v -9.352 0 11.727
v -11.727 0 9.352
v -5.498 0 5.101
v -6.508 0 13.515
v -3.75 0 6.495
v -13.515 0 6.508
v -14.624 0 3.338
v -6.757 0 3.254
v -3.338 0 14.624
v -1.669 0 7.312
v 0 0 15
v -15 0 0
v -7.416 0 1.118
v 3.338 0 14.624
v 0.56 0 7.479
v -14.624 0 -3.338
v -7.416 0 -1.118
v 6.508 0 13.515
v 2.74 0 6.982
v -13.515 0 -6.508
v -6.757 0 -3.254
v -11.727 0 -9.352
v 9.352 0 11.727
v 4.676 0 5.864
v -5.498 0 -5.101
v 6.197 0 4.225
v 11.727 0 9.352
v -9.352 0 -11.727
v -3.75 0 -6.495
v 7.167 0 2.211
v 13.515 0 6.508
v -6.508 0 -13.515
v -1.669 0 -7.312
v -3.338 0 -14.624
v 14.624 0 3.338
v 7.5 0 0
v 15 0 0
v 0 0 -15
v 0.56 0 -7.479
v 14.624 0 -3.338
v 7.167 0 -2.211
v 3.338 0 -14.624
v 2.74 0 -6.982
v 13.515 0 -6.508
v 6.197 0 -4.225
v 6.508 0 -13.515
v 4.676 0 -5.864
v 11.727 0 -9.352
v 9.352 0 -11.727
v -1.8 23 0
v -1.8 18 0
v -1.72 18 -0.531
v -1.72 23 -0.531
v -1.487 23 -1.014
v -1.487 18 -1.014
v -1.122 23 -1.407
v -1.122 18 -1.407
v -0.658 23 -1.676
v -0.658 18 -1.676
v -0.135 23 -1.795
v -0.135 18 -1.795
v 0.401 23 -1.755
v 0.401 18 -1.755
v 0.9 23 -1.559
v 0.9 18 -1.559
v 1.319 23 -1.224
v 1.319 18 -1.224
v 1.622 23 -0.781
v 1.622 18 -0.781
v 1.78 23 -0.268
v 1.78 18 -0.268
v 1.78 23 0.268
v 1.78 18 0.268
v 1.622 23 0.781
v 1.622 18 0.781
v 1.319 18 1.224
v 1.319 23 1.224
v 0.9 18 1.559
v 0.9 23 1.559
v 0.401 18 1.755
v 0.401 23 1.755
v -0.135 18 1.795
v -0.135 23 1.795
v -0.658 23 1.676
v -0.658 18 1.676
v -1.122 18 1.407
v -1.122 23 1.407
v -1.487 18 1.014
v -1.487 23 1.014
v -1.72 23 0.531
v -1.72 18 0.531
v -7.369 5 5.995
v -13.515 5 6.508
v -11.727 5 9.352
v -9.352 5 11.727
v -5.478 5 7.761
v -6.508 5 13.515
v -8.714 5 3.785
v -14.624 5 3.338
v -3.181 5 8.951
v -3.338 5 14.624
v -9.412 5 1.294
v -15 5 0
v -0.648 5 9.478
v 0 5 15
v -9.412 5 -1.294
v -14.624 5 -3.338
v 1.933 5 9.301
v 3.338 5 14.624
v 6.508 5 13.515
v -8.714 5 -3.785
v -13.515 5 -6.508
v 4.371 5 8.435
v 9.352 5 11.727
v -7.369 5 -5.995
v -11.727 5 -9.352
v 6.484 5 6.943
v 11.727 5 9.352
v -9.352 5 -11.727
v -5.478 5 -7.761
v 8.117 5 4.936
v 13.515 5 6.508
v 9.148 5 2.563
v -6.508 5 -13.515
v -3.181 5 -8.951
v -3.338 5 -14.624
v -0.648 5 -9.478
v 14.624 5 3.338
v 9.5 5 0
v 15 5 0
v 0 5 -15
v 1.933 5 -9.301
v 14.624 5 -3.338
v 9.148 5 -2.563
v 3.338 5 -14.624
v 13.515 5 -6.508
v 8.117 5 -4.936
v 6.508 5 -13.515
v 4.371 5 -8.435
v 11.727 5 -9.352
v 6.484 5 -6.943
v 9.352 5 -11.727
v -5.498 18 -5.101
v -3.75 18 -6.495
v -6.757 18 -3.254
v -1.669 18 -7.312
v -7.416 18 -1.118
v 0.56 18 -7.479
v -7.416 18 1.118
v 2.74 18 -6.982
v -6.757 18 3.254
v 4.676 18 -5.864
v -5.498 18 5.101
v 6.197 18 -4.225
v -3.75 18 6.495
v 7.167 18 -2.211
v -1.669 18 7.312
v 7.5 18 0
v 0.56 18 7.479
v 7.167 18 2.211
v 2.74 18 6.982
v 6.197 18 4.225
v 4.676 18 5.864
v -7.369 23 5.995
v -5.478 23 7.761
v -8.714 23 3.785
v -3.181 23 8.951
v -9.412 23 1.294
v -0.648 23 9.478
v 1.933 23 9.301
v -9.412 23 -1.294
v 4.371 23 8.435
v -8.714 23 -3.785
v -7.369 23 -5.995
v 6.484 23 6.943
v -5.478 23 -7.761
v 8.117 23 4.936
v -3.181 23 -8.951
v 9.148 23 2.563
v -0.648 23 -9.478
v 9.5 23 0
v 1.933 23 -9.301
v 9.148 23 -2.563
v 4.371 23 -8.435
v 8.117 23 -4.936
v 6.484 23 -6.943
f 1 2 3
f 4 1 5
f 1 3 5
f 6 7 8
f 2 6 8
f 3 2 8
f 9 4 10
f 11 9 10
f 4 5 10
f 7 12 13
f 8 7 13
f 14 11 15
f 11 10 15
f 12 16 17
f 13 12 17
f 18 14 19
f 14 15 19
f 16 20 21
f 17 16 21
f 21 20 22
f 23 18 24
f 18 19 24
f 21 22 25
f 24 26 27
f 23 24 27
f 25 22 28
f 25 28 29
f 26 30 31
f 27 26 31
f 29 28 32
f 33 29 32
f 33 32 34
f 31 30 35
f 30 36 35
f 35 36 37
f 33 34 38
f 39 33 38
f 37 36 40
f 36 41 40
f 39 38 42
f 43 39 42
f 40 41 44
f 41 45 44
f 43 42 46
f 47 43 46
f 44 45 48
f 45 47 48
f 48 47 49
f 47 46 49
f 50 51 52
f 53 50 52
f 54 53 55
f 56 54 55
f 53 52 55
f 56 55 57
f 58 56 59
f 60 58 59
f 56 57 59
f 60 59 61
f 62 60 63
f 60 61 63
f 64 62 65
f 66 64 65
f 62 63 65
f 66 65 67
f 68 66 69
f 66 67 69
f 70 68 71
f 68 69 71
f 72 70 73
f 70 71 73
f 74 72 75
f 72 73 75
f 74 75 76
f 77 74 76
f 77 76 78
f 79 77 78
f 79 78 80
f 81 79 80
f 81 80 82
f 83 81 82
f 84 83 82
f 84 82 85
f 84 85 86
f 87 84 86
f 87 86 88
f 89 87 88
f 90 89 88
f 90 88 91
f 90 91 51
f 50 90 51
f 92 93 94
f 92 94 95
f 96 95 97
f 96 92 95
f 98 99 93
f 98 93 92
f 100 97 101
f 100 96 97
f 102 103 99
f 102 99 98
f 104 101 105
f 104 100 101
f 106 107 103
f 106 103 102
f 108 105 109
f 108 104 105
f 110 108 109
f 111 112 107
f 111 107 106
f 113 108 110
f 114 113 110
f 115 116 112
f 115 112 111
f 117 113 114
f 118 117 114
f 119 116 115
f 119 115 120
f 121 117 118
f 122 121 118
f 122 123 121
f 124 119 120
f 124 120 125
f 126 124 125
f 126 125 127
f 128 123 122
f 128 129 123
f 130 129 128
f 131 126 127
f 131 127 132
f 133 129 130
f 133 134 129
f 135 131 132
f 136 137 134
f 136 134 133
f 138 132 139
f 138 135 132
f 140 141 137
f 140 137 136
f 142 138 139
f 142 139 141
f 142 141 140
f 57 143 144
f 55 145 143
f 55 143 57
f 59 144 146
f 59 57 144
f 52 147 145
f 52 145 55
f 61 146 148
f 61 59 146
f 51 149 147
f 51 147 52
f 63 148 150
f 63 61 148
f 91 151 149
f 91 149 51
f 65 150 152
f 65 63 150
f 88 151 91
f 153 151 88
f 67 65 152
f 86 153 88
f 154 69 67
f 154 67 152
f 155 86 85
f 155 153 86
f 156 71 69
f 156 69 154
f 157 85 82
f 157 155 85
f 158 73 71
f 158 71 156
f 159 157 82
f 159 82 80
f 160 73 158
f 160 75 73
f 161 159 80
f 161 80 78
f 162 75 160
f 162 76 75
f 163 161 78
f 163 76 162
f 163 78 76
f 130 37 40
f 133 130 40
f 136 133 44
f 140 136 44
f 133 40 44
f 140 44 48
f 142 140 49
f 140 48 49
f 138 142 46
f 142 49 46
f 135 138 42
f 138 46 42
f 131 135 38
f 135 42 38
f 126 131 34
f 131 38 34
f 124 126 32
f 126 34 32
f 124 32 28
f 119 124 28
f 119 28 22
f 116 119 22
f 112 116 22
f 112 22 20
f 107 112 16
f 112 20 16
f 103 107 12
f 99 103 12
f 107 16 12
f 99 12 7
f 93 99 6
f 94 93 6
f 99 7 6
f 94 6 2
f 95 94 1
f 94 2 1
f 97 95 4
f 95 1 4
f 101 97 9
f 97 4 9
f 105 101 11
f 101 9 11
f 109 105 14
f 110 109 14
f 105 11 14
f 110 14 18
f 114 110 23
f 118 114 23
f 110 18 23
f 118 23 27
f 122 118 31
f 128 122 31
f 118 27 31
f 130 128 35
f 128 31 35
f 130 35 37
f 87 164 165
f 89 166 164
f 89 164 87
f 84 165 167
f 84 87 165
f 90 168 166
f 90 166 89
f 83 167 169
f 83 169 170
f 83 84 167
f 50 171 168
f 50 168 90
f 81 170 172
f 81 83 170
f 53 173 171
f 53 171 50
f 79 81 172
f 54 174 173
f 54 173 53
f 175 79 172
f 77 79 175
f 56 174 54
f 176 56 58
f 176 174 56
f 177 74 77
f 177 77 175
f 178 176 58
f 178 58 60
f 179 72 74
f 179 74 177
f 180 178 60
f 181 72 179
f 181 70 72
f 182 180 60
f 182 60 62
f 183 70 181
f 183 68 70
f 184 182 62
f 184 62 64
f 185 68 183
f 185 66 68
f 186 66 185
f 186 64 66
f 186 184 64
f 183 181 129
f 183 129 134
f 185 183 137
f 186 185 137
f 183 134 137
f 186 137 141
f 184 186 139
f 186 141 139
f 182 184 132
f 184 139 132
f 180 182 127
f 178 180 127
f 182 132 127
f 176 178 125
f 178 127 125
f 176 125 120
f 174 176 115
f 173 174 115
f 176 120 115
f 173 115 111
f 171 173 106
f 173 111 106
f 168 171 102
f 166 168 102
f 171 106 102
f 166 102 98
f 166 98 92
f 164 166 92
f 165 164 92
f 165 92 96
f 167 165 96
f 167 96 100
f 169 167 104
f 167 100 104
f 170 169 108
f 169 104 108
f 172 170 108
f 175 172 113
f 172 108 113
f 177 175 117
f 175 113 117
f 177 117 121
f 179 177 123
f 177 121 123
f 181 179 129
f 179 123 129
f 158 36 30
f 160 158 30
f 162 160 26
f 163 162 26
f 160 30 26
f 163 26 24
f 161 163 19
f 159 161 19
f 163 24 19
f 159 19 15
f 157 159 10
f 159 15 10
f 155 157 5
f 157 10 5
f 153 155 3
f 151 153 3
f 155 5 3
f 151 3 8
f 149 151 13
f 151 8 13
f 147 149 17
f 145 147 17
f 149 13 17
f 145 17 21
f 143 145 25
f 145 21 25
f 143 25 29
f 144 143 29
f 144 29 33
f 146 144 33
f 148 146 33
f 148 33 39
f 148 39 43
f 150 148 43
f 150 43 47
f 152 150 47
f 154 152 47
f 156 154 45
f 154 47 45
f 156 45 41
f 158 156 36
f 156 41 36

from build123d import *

# Parameters (mm, degrees)
SKETCH2_R            = 15
BOSS_EXTRUDE1_DEPTH  = 5
SKETCH3_R            = 9.5
BOSS_EXTRUDE2_DEPTH  = 18
SKETCH4_R            = 7.5
CUT_EXTRUDE1_DEPTH   = 18
M3_CLEARANCE_HOLE1_D = 3.6


with BuildPart() as part:
    # Sketch2 → Boss-Extrude1 (new body)
    with BuildSketch(Plane(origin=(0, 0, 0), x_dir=(1, 0, 0), z_dir=(0, 1, 0))):
        Circle(SKETCH2_R)
    extrude(amount=BOSS_EXTRUDE1_DEPTH)

    # Sketch3 → Boss-Extrude2 (add)
    with BuildSketch(Plane(origin=(0, 5, 0), x_dir=(1, 0, 0), z_dir=(0, 1, 0))):
        Circle(SKETCH3_R)
    extrude(amount=BOSS_EXTRUDE2_DEPTH)

    # Sketch4 → Cut-Extrude1 (cut)
    with BuildSketch(Plane.XZ):
        Circle(SKETCH4_R)
    extrude(amount=-CUT_EXTRUDE1_DEPTH, mode=Mode.SUBTRACT)

    # M3 Clearance Hole1 (through all)
    with Locations(Plane(origin=(0, 23, 0), x_dir=(1, 0, 0), z_dir=(0, 1, 0))):
        with Locations((0, 0)):
            Hole(M3_CLEARANCE_HOLE1_D / 2)


solid = part.part
